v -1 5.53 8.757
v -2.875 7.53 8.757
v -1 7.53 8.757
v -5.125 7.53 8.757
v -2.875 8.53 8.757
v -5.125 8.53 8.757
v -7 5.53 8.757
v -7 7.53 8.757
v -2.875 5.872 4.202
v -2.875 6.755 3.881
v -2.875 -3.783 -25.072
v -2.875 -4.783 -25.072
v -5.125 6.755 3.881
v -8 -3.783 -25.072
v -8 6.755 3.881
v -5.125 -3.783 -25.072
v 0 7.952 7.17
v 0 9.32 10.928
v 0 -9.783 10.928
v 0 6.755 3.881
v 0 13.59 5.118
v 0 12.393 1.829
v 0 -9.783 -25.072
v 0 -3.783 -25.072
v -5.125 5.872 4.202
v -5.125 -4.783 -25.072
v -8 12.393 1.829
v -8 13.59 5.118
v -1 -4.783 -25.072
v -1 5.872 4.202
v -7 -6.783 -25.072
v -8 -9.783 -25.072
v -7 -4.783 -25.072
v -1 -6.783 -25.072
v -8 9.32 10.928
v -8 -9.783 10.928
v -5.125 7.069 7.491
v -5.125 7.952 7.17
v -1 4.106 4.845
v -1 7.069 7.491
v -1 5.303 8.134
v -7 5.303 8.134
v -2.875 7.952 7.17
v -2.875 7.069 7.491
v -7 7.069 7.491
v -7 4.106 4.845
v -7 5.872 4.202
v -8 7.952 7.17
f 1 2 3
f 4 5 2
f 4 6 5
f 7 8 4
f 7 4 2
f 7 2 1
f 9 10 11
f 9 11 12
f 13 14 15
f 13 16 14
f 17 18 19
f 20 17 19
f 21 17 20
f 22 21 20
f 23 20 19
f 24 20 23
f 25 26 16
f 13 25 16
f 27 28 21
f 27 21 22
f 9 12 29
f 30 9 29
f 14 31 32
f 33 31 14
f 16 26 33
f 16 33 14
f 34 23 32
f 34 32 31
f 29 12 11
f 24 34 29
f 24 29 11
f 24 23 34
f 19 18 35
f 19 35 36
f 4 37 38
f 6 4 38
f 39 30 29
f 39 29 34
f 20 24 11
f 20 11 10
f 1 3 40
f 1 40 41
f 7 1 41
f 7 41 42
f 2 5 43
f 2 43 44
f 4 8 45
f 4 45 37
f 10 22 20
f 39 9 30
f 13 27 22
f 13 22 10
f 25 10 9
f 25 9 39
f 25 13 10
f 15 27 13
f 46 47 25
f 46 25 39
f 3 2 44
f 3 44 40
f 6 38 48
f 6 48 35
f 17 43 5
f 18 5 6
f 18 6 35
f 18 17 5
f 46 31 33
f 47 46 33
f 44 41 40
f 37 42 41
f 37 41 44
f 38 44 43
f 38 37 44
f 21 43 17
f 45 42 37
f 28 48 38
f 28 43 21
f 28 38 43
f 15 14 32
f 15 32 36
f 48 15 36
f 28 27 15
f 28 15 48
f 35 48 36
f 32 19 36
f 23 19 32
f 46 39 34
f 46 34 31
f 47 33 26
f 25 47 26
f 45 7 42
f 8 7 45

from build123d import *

# Parameters (mm, degrees)
BOSS_EXTRUDE1_DEPTH = 8
BOSS_EXTRUDE2_DEPTH = 8


with BuildPart() as part:
    # Sketch2 → Boss-Extrude1 (new body)
    with BuildSketch(Plane(origin=(0, 0, 0), x_dir=(0, 0, -1), z_dir=(1, 0, 0))):
        Polygon((-10.928495294, -9.782945939), (25.071504706, -9.782945939), (25.071504706, -3.782945939), (-10.928495294, 9.319982495), align=None)
    extrude(amount=-BOSS_EXTRUDE1_DEPTH)

    # Cut-Sweep3: sweep along a path in Sketch5
    with BuildLine(Plane.ZY.offset(8)) as cut_sweep3_path:
        Line((-25.071504706, -6.975479256), (8.757429642, 5.337245904))
    # Sketch3 → Cut-Sweep3 (sweep, cut)
    with BuildSketch(Plane(origin=(0, 0, -25.071504706), x_dir=(-1, 0, 0), z_dir=(0, 0, -1))):
        Polygon((2.875, -3.782945939), (2.875, -4.782945939), (1, -4.782945939), (1, -6.782945939), (7, -6.782945939), (7, -4.782945939), (5.125, -4.782945939), (5.125, -3.782945939), align=None)
    sweep(path=cut_sweep3_path.line, mode=Mode.SUBTRACT)

    # Sketch6 → Boss-Extrude2 (add)
    with BuildSketch(Plane.ZY.offset(8)):
        Polygon((4.906861068, 3.935753558), (8.195785241, 5.132824059), (5.117603951, 13.590057646), (1.828679778, 12.392987145), align=None)
    extrude(amount=-BOSS_EXTRUDE2_DEPTH)


solid = part.part
